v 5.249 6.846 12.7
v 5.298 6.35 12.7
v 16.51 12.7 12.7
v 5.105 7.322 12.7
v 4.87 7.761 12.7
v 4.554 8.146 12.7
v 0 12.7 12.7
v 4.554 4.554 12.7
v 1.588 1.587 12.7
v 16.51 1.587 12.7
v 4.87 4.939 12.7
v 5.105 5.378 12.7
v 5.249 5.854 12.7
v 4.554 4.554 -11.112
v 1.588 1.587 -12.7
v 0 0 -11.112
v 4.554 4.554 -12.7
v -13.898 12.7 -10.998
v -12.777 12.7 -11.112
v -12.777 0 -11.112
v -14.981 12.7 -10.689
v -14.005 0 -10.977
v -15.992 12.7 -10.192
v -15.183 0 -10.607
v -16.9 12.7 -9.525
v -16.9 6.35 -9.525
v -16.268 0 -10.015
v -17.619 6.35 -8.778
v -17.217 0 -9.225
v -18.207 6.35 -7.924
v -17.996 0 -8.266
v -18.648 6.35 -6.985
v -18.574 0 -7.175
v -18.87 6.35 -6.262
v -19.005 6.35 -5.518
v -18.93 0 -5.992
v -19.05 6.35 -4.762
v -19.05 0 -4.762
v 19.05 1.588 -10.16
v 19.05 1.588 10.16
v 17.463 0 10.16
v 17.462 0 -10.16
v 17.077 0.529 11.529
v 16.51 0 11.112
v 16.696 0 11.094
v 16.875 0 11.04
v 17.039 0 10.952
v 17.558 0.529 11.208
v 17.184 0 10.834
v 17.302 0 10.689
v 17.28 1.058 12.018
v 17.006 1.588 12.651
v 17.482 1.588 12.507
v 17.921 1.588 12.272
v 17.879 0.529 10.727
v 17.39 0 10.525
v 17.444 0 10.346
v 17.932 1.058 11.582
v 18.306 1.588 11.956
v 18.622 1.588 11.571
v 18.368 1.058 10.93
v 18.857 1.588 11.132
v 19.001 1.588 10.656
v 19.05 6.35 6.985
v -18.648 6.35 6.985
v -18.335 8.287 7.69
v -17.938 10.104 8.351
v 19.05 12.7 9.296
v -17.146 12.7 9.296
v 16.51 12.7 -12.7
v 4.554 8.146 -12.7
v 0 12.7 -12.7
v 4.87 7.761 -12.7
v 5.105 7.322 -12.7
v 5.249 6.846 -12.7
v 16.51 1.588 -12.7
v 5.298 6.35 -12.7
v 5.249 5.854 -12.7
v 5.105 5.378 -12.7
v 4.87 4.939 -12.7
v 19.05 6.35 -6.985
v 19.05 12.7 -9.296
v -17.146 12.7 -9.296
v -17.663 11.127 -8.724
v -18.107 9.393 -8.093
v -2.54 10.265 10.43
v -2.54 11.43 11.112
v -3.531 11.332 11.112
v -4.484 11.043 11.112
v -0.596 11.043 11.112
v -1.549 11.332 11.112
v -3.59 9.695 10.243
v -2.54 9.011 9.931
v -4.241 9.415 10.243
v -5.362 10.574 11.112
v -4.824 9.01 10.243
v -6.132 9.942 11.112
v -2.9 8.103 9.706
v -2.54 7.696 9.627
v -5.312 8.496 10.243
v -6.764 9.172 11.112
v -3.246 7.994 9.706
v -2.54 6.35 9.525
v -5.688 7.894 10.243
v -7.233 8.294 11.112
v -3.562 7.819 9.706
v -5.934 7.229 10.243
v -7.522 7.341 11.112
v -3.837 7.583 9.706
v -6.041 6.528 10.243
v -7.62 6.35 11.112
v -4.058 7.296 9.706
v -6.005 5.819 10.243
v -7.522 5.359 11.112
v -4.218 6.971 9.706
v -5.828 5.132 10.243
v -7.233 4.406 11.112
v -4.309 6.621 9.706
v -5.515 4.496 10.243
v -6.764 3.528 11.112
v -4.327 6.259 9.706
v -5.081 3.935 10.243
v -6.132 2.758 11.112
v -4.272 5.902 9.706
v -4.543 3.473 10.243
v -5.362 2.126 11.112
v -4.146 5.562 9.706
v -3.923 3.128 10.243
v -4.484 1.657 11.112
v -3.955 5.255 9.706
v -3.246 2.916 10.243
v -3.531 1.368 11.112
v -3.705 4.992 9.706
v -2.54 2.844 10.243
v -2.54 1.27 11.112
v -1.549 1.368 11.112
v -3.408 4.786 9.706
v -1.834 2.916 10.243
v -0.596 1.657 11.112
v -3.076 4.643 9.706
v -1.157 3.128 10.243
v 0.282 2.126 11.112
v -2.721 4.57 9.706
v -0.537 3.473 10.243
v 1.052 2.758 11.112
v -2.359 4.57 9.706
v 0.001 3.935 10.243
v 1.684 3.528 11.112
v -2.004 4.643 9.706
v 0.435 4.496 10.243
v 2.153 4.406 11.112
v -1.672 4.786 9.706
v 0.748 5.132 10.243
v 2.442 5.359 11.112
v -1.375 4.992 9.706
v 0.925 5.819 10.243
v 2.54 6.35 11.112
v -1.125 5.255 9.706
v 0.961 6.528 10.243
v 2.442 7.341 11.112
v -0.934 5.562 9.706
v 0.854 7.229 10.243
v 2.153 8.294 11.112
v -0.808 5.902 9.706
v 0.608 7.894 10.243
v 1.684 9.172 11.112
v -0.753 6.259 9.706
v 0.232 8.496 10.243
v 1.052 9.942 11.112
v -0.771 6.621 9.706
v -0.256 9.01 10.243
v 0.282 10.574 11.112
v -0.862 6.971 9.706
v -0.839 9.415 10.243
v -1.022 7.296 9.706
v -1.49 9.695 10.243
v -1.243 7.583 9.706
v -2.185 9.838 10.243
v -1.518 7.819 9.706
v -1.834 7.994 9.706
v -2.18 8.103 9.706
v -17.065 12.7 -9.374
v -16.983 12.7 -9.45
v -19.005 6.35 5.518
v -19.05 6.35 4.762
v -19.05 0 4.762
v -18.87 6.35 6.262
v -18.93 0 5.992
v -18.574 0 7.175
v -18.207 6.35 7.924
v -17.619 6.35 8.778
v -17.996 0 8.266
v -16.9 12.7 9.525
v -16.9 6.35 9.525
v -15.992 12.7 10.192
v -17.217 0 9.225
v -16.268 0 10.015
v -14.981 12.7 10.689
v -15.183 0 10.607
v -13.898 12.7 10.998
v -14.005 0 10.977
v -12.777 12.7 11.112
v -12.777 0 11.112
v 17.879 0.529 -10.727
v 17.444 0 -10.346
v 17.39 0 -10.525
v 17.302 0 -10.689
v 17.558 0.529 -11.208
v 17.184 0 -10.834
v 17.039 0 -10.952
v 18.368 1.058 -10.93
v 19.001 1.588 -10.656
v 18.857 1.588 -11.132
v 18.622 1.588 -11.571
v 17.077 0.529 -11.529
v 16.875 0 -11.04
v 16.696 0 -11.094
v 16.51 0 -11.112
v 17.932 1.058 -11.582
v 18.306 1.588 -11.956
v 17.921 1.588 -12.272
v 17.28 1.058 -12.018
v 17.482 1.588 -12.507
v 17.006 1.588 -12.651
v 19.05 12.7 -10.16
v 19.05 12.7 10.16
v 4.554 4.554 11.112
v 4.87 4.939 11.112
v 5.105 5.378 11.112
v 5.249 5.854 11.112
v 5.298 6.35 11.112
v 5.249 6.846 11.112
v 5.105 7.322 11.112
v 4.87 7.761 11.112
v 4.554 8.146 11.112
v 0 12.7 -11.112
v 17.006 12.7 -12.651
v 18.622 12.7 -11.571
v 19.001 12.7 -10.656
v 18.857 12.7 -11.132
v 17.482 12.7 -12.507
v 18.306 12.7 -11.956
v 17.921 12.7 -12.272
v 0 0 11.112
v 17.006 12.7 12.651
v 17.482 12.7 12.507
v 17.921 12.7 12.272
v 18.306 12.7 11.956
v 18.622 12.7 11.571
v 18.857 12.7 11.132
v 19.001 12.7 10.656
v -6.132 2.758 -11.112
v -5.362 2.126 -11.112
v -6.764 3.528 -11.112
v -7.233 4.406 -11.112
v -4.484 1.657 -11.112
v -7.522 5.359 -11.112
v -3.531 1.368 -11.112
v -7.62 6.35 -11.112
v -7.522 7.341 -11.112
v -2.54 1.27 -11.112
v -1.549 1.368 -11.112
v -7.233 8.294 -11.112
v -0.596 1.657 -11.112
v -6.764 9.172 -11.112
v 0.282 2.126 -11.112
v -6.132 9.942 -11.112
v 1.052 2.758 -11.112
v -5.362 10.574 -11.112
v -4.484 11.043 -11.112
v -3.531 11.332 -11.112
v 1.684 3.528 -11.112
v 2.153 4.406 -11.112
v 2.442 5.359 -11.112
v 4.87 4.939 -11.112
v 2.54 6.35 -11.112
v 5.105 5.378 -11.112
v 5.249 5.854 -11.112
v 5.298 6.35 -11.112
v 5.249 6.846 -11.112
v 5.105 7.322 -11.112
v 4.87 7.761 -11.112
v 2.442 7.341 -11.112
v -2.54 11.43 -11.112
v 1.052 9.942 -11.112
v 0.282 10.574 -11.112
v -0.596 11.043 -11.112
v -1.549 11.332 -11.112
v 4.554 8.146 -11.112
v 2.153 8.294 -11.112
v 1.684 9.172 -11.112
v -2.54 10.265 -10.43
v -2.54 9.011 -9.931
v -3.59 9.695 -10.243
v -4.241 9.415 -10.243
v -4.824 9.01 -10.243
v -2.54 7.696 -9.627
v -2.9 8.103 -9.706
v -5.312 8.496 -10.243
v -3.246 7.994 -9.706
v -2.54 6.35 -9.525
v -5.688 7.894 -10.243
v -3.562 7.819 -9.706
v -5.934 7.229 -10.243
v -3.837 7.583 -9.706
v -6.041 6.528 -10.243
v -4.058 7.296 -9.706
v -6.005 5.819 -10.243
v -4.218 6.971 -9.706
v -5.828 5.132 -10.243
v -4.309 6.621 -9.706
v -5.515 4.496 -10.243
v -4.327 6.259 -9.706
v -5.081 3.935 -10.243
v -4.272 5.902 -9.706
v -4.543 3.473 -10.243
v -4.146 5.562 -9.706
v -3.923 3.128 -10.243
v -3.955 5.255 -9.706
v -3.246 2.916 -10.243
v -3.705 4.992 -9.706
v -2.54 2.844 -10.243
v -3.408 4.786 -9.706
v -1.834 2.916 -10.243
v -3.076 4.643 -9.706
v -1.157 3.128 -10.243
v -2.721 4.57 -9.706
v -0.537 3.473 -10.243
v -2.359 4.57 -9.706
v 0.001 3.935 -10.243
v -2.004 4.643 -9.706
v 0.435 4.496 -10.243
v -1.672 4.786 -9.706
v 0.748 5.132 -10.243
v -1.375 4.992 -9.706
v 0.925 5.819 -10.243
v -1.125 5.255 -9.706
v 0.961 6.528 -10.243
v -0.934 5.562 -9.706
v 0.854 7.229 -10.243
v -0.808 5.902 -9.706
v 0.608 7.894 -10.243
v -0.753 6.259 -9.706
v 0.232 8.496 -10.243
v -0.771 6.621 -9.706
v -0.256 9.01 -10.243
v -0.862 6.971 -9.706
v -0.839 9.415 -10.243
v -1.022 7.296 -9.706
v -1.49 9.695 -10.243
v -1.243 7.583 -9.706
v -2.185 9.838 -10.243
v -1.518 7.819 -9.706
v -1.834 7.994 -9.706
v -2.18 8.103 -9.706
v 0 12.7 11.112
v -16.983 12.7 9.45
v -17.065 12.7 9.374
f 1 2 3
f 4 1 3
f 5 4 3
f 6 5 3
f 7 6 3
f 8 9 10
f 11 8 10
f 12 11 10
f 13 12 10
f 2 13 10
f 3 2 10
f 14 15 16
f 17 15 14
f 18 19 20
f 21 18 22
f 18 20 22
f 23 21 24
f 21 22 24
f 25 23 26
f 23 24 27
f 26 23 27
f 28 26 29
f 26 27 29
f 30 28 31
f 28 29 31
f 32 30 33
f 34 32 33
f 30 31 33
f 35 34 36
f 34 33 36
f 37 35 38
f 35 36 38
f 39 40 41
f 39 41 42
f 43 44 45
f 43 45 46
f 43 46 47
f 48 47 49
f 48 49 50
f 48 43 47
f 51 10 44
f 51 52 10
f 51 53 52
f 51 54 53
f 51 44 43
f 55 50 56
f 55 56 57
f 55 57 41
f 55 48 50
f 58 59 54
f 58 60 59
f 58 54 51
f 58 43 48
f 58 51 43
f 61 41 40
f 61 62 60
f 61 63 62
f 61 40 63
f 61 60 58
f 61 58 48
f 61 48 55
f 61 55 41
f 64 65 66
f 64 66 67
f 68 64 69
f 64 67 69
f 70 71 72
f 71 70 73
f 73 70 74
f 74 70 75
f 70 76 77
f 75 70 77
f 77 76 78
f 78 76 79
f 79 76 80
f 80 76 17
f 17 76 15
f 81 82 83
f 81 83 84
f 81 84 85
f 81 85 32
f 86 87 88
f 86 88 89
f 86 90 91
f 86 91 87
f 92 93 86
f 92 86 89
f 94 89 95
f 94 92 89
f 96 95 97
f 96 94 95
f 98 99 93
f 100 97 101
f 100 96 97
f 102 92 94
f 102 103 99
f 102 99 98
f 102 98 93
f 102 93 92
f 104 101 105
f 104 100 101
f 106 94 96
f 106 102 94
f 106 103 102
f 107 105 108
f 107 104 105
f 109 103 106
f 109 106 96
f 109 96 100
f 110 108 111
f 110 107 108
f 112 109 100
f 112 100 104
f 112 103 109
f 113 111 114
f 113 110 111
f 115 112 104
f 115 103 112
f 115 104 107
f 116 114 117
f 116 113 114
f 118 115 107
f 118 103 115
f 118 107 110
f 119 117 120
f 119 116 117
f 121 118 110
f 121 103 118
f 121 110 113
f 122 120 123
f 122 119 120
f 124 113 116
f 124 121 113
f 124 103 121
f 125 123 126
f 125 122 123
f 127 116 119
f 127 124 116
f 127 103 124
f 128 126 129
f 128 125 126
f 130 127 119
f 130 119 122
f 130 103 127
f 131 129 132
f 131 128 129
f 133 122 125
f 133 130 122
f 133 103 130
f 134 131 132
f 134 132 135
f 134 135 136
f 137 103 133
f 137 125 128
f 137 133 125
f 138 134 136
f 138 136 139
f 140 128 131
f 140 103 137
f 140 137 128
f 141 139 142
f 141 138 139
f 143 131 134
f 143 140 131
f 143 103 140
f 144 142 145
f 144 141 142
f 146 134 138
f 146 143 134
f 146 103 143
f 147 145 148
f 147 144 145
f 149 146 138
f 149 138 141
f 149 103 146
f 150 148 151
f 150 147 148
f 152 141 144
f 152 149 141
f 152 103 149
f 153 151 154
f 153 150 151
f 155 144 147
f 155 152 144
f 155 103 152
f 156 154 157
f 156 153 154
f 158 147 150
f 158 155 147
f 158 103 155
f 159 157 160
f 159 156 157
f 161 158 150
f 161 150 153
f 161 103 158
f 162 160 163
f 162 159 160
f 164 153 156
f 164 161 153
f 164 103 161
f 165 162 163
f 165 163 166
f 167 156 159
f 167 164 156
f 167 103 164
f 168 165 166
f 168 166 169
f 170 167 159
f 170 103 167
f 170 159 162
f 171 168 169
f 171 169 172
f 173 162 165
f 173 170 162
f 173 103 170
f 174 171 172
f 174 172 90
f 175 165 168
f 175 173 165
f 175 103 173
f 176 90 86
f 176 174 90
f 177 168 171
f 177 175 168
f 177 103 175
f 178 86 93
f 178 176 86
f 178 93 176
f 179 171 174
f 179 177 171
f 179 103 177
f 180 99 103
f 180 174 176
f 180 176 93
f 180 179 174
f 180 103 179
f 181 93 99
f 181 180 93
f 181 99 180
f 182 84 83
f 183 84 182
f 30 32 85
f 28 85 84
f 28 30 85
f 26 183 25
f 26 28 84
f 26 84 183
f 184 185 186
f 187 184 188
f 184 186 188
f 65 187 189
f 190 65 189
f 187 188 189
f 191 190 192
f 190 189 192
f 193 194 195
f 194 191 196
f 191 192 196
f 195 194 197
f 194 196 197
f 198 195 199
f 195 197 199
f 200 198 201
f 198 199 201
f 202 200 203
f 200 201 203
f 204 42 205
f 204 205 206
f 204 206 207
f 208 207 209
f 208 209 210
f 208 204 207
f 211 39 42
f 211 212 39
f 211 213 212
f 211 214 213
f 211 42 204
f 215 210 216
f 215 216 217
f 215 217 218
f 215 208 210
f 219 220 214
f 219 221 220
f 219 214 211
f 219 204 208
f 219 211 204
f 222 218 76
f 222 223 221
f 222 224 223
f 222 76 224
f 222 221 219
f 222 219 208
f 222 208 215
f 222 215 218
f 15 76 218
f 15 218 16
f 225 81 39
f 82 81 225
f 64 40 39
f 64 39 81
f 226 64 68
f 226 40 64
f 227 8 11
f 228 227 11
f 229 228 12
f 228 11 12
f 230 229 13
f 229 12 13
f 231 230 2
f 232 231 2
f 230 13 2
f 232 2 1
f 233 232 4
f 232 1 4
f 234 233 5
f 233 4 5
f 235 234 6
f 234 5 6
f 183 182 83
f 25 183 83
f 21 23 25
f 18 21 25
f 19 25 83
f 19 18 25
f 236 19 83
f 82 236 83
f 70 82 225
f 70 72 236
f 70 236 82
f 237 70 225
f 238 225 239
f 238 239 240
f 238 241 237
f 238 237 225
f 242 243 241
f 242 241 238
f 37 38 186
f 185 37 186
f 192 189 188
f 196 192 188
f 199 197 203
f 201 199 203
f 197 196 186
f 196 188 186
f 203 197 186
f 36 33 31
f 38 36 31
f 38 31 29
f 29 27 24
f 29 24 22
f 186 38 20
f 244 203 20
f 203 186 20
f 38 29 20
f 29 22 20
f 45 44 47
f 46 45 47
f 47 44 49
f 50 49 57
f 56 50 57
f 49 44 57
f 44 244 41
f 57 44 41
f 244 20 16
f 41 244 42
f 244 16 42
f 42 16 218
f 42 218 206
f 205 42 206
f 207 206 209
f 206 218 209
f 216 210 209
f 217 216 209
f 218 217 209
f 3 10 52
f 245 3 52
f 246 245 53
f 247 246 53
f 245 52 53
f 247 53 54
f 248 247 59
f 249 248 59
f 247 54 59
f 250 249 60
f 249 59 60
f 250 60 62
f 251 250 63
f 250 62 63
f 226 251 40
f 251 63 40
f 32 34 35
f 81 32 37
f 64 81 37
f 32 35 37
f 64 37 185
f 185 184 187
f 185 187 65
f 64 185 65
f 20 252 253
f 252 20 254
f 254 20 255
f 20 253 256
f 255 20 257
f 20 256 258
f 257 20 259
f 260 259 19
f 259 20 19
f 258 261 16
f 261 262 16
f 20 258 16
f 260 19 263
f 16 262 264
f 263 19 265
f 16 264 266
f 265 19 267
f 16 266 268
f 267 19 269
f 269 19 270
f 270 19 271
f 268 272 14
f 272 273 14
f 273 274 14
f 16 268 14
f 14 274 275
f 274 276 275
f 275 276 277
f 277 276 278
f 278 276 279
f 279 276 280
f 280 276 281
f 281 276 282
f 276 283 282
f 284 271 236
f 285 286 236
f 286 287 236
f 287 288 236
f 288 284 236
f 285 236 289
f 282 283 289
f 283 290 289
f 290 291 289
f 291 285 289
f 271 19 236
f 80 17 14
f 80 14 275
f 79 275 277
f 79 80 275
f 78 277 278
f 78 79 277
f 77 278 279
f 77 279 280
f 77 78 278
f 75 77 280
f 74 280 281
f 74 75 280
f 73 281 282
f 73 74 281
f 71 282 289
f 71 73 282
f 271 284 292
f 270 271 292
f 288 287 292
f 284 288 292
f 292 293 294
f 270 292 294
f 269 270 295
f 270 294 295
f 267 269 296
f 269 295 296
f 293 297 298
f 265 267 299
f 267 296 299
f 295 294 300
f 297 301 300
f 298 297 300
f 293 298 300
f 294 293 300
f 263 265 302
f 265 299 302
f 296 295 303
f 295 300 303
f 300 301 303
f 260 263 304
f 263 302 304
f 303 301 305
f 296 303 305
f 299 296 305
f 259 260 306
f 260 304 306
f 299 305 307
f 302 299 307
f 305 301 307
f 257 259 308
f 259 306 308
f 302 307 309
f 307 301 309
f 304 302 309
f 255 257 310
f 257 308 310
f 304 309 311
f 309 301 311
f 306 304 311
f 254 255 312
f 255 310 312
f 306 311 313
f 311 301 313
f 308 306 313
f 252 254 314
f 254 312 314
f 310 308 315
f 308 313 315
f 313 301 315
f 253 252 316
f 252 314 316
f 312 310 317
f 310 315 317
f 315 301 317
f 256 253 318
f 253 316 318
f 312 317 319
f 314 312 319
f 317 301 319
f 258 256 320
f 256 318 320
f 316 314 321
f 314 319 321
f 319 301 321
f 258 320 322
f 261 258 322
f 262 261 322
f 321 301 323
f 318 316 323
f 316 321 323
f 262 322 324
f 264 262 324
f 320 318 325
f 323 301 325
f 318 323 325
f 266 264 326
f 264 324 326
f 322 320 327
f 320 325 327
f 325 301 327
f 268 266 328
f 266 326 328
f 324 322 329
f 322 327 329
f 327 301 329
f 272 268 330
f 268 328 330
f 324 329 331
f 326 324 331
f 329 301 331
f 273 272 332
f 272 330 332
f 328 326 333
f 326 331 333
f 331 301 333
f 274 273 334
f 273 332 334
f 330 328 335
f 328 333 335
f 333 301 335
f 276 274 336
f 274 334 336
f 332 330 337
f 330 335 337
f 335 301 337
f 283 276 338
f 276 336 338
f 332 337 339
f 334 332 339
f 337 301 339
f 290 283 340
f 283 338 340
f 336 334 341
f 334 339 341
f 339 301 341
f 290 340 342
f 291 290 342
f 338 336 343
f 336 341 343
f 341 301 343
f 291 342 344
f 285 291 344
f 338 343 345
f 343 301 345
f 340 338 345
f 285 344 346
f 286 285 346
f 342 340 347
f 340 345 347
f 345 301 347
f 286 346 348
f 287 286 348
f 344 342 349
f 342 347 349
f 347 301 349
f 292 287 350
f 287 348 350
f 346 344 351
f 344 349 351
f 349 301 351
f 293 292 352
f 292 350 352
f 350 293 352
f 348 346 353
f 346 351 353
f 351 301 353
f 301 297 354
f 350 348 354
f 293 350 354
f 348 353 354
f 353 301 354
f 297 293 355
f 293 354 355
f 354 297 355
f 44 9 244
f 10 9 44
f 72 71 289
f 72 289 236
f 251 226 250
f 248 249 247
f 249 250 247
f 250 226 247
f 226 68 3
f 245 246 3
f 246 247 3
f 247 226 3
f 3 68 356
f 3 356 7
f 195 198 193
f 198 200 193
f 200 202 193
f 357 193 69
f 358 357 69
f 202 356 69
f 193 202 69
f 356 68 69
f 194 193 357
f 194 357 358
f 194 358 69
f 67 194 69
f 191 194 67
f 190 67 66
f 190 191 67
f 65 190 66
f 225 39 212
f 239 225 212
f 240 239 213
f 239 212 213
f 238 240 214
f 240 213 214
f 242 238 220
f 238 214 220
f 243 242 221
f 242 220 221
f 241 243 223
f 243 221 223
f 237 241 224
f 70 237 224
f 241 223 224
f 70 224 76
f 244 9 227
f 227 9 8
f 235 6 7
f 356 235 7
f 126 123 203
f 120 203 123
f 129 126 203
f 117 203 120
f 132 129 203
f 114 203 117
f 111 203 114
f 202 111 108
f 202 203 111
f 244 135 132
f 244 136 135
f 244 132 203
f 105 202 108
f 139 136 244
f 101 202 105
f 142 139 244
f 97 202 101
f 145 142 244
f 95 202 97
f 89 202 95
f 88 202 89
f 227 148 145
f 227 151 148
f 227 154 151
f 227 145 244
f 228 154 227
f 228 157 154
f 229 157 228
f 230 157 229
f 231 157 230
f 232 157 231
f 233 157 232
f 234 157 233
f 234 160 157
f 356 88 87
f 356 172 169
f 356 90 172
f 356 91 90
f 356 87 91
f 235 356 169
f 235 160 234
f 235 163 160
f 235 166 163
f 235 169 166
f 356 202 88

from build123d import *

# Parameters (mm, degrees)
BOSS_EXTRUDE1_DEPTH = 12.7
SKETCH2_W           = 19.05
SKETCH2_H           = 6.35
CUT_EXTRUDE1_DEPTH  = 43.121134838
CHAMFER1_START      = -18.648360593
CHAMFER1_DEPTH      = 37.698360593
CHAMFER1_START_2    = 6.35
CHAMFER1_2_DEPTH    = 7.65
CUT_EXTRUDE3_DEPTH  = 1.5875
CHAMFER3_SIZE       = 1.5875


with BuildPart() as part:
    # Sketch1 → Boss-Extrude1 (new body)
    with BuildSketch(Plane(origin=(0, 0, 0), x_dir=(1, 0, 0), z_dir=(0, 1, 0))):
        with BuildLine():
            Line((-11.189157294, -12.7), (16.51, -12.7))
            ThreePointArc((16.51, -12.7), (18.306051224, -11.956051224), (19.05, -10.16))
            Line((19.05, -10.16), (19.05, 10.16))
            ThreePointArc((19.05, 10.16), (18.306051224, 11.956051224), (16.51, 12.7))
            Line((16.51, 12.7), (-11.189157294, 12.7))
            Line((-11.189157294, 12.7), (-12.777125687, 11.112031607))
            ThreePointArc((-12.777125687, 11.112031607), (-17.21731381, 9.225276708), (-19.05, 4.7625))
            Line((-19.05, 4.7625), (-19.05, -4.7625))
            ThreePointArc((-19.05, -4.7625), (-17.21731381, -9.225276708), (-12.777125687, -11.112031607))
            Line((-12.777125687, -11.112031607), (-11.189157294, -12.7))
        make_face()
    extrude(amount=BOSS_EXTRUDE1_DEPTH)

    # Sketch2 → Cut-Extrude1 (cut, through all)
    with BuildSketch(Plane.ZY.offset(19.05)):
        with Locations((0, 9.525)):
            Rectangle(SKETCH2_W, SKETCH2_H)
    extrude(amount=-CUT_EXTRUDE1_DEPTH, mode=Mode.SUBTRACT)

    # Chamfer1: read off the stored shape, not the designer's step
    # Chamfer1 outline → Chamfer1 (add)
    with BuildSketch(Plane.YZ.offset(CHAMFER1_START)):
        Polygon((6.35, 9.525), (6.35, 6.985), (12.7, 9.296210988), (12.7, 9.525), align=None)
        Polygon((12.7, -9.296210988), (6.35, -6.985), (6.35, -9.525), (12.7, -9.525), align=None)
    extrude(amount=CHAMFER1_DEPTH)

    # Chamfer1 2 outline → Chamfer1 2 (cut)
    with BuildSketch(Plane(origin=(0, 0, 0), x_dir=(1, 0, 0), z_dir=(0, 1, 0)).offset(CHAMFER1_START_2)):
        with BuildLine():
            Line((-18.648360593, -9.525), (-16.900130206, -9.525))
            ThreePointArc((-16.900130206, -9.525), (-17.930761549, -8.362726885), (-18.648360594, -6.985))
            Line((-18.648360594, -6.985), (-18.648360593, -9.525))
        make_face()
        with BuildLine():
            Line((-18.648360593, 9.525), (-18.648360594, 6.985))
            ThreePointArc((-18.648360594, 6.985), (-17.930761549, 8.362726885), (-16.900130206, 9.525))
            Line((-16.900130206, 9.525), (-18.648360593, 9.525))
        make_face()
    extrude(amount=CHAMFER1_2_DEPTH, mode=Mode.SUBTRACT)

    # Sketch4 → Cut-Extrude3 (cut)
    with BuildSketch(Plane.XY.offset(12.7)):
        with BuildLine():
            Line((-19.05, 0), (0, 0))
            Line((0, 0), (4.553948776, 4.553948776))
            ThreePointArc((4.553948776, 4.553948776), (5.297897552, 6.35), (4.553948776, 8.146051224))
            Line((4.553948776, 8.146051224), (0, 12.7))
            Line((0, 12.7), (-19.05, 12.7))
            Line((-19.05, 12.7), (-19.05, 0))
        make_face()
    cut_extrude3 = extrude(amount=-CUT_EXTRUDE3_DEPTH, mode=Mode.SUBTRACT)

    # Sketch6 → Cut-Revolve1 (revolve, cut)
    with BuildSketch(Plane.ZY.offset(2.54)):
        with BuildLine():
            Line((11.1125, 6.35), (11.1125, 11.43))
            ThreePointArc((11.1125, 11.43), (9.931118256, 9.01113492), (9.525, 6.35))
            Line((9.525, 6.35), (11.1125, 6.35))
        make_face()
    cut_revolve1 = revolve(axis=Axis((-2.54, 6.35, 0), (0, 0, 1)), mode=Mode.SUBTRACT)

    # Mirror1: Cut-Extrude3, Cut-Revolve1 across plane
    add(cut_extrude3.mirror(Plane(origin=(0, 0, 0), x_dir=(1, 0, 0), z_dir=(0, 0, -1))), mode=Mode.SUBTRACT)
    add(cut_revolve1.mirror(Plane(origin=(0, 0, 0), x_dir=(1, 0, 0), z_dir=(0, 0, -1))), mode=Mode.SUBTRACT)

    # Chamfer3
    chamfer3_edges = [part.edges().sort_by_distance(p)[0] for p in [
        (8.255, 0, 12.7),
        (18.306051224, 0, 11.956051224),
        (19.05, 0, 0),
        (18.306051224, 0, -11.956051224),
        (8.255, 0, -12.7),
    ]]
    chamfer(chamfer3_edges, length=CHAMFER3_SIZE)


solid = part.part
